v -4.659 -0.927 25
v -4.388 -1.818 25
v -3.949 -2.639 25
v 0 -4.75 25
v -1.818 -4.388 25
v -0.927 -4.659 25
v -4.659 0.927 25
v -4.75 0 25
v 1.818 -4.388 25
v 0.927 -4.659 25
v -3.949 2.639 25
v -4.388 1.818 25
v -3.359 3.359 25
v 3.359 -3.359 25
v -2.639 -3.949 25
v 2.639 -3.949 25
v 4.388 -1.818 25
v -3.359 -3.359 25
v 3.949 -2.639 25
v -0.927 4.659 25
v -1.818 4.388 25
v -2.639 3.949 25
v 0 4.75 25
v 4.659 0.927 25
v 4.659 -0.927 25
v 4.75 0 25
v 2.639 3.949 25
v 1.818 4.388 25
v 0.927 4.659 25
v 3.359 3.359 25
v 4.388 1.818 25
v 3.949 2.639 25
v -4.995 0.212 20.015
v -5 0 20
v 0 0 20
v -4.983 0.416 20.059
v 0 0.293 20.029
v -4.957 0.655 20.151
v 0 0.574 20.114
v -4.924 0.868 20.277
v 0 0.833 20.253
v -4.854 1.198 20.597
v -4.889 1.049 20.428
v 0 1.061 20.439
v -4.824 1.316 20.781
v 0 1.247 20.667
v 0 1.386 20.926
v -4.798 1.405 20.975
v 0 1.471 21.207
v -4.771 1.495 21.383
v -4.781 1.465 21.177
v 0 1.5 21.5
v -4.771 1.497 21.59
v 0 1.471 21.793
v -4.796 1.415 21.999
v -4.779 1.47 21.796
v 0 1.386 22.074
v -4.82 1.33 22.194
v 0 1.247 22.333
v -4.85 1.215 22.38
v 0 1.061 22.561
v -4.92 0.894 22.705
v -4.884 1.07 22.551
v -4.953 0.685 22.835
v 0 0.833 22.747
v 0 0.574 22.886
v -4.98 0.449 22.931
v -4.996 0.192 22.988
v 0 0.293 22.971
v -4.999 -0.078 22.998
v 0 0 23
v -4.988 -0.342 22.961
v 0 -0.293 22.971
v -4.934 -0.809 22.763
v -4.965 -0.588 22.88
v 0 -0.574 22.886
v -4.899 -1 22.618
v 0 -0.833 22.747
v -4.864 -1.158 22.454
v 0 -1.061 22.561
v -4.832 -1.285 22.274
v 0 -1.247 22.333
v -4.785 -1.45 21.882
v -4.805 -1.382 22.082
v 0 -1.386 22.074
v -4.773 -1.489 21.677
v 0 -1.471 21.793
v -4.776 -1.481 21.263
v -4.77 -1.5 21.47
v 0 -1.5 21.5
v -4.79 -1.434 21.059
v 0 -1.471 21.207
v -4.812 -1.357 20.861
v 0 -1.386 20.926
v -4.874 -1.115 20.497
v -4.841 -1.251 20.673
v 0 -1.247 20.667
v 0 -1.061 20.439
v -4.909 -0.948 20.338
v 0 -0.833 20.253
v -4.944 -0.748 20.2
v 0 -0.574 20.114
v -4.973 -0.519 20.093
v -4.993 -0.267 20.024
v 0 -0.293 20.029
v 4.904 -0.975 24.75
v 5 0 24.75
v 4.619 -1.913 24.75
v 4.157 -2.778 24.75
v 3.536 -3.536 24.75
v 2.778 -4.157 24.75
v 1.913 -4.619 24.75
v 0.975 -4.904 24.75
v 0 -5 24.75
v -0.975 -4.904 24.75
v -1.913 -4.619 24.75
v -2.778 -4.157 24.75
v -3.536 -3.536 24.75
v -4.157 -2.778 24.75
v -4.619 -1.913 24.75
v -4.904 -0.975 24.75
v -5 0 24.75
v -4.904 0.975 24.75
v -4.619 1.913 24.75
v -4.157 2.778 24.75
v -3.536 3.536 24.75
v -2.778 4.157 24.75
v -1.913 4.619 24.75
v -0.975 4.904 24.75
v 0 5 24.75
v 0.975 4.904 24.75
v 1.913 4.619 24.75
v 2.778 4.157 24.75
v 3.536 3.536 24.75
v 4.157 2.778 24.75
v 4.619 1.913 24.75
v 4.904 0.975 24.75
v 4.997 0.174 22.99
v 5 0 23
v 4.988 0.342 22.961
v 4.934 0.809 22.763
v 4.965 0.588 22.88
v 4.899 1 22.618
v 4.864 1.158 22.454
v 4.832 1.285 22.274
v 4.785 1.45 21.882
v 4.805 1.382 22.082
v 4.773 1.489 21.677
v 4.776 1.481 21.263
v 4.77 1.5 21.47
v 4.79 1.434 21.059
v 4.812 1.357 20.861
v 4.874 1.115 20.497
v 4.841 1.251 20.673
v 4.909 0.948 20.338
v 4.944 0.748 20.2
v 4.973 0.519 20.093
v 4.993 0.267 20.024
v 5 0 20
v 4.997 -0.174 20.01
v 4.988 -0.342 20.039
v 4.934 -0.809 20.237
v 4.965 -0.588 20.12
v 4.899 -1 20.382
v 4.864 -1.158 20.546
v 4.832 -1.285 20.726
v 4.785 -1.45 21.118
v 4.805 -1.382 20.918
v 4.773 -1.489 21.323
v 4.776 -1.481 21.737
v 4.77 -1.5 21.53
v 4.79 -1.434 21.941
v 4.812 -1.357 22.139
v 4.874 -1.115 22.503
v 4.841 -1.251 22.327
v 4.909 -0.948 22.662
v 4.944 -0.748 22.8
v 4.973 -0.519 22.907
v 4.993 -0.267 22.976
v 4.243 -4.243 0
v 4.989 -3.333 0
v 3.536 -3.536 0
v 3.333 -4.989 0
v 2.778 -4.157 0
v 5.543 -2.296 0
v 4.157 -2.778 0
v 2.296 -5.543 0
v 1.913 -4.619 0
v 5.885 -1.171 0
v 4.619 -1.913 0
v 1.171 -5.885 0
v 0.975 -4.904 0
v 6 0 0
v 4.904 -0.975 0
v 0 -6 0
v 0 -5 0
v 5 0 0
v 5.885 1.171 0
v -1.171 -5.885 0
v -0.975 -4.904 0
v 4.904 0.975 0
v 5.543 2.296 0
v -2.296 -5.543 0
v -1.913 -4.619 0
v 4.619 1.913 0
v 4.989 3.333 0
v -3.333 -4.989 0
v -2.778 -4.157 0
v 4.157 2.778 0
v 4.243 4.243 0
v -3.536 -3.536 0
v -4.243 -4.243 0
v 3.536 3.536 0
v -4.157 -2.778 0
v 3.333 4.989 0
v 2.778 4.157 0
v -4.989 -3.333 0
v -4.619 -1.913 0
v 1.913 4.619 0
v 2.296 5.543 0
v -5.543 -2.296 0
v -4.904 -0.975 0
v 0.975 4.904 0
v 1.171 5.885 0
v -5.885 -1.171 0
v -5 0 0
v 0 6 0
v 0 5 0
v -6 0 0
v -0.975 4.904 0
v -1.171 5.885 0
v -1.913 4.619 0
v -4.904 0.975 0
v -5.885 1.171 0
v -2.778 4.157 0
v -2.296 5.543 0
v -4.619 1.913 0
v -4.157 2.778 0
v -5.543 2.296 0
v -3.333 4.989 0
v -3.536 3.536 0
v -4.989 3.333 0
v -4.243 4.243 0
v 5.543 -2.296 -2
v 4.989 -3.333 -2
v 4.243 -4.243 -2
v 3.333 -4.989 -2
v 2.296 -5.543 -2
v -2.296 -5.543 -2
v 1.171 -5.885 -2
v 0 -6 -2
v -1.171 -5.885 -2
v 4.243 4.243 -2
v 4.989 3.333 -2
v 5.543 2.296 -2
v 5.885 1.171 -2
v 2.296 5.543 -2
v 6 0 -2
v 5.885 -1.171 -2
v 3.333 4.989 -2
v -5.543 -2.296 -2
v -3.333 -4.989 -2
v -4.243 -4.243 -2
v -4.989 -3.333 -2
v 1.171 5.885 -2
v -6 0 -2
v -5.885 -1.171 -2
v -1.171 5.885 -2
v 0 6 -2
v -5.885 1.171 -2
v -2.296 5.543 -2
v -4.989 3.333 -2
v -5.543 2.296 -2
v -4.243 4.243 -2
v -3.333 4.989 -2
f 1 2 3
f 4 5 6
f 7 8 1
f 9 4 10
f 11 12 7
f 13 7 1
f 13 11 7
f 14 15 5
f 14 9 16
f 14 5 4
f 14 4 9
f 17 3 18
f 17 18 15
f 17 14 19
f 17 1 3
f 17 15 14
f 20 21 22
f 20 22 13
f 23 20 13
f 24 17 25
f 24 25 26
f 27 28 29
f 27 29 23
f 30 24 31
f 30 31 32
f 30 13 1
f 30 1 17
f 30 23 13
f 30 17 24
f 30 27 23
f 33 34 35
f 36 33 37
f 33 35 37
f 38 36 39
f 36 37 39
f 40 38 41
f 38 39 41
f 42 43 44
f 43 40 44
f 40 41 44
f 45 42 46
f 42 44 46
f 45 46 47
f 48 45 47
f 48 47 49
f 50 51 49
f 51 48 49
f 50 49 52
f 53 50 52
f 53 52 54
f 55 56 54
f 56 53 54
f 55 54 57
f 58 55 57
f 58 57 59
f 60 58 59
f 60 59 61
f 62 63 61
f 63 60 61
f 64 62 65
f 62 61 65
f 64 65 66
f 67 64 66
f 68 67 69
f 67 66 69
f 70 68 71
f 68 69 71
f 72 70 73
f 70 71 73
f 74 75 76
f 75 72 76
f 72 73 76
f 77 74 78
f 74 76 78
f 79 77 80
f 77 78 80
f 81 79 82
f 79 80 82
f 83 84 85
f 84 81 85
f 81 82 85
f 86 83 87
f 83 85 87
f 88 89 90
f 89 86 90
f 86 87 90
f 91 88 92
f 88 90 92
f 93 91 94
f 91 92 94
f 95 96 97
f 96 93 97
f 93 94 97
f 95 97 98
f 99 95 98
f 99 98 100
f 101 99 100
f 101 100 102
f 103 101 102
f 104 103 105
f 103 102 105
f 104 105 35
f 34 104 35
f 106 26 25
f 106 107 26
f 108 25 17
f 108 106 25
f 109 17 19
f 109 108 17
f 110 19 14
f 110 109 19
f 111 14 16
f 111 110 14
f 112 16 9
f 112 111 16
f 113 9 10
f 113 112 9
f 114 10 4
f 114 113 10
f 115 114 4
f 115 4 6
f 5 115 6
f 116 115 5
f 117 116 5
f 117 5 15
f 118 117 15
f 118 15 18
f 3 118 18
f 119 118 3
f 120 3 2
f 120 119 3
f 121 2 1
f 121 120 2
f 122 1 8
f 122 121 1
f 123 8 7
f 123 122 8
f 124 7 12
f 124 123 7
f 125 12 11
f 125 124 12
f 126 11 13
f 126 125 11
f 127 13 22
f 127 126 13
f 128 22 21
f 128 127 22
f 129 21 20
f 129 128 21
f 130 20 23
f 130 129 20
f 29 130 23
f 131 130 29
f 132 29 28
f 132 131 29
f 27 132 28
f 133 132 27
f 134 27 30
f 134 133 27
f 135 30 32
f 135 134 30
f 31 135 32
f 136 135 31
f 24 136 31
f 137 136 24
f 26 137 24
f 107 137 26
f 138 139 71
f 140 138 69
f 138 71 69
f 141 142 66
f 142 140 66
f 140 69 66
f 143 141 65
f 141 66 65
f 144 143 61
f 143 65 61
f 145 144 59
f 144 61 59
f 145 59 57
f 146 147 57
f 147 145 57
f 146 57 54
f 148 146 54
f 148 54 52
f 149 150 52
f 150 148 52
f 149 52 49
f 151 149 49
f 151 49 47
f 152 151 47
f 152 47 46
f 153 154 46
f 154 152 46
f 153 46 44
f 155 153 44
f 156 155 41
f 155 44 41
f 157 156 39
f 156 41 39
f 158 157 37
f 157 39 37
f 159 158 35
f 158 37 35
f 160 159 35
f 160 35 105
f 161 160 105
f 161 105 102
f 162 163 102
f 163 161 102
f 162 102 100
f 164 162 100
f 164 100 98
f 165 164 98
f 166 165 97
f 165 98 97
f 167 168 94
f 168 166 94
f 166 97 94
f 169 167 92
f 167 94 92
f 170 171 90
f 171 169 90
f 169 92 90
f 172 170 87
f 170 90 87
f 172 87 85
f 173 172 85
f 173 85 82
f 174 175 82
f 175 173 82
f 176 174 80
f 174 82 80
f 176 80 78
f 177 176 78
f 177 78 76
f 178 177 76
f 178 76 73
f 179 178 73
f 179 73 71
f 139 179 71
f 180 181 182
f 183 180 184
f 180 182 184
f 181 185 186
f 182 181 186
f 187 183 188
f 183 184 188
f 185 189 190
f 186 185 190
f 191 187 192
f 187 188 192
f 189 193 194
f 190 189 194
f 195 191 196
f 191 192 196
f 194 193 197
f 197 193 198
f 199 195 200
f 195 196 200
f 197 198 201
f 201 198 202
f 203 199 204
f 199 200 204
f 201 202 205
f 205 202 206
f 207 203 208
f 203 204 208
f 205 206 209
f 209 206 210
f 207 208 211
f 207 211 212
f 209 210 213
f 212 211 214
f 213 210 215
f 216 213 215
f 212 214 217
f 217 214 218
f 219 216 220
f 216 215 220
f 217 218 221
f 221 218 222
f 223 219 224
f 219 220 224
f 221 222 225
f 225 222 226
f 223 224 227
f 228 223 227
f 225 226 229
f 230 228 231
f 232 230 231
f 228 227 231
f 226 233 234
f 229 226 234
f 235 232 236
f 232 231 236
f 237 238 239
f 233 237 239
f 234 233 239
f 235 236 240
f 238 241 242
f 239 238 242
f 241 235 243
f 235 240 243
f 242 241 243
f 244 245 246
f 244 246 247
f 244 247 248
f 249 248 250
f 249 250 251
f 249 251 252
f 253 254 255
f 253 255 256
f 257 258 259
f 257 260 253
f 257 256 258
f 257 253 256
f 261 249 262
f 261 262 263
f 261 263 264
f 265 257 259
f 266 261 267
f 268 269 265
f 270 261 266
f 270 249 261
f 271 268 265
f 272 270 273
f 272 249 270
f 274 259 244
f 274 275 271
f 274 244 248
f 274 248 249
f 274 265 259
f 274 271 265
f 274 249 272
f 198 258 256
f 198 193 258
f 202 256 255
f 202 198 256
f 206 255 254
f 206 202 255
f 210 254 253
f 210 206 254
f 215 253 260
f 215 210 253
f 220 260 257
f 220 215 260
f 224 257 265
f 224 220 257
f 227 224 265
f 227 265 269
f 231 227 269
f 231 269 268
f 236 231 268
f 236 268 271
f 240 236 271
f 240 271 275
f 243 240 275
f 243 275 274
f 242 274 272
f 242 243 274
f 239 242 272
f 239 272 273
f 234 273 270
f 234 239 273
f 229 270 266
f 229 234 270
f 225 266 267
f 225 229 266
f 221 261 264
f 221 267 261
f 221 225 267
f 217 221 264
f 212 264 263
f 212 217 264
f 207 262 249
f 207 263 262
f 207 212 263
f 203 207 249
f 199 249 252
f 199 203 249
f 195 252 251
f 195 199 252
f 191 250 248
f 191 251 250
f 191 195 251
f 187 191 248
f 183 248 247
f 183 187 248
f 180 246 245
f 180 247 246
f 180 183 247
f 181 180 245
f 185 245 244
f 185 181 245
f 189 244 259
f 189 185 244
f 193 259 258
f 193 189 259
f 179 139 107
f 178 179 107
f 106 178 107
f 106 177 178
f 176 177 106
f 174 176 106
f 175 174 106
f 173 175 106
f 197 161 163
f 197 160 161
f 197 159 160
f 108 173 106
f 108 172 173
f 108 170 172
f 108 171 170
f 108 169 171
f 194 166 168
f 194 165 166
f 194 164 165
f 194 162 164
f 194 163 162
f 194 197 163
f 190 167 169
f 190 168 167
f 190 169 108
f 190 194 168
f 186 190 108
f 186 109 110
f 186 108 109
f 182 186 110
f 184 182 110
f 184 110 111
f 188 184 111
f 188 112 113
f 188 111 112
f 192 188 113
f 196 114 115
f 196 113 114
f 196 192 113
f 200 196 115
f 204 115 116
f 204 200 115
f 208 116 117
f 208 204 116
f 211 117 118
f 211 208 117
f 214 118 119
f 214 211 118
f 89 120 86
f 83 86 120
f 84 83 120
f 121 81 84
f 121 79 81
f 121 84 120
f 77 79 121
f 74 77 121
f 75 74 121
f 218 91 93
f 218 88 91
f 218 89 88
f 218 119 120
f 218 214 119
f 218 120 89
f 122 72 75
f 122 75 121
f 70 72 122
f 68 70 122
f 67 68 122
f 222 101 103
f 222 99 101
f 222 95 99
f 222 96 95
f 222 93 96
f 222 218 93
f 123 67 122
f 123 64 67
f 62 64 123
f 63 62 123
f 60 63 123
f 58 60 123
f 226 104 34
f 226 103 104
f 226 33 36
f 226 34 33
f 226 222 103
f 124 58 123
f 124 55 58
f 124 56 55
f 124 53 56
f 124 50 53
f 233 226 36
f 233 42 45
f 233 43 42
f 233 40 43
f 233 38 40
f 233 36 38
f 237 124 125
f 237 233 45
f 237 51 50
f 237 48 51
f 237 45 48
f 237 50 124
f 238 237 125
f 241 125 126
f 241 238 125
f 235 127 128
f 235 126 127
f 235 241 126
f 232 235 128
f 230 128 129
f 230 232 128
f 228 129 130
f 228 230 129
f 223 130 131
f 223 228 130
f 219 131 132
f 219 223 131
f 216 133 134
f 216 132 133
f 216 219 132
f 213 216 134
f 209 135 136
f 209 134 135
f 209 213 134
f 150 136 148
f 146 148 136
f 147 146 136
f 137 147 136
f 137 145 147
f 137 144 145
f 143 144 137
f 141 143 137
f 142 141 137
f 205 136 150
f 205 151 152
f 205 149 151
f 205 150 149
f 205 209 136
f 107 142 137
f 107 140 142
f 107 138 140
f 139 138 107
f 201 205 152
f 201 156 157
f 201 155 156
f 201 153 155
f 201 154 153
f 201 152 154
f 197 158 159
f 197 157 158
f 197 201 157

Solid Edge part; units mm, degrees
sketch "Sketch1" plane through (0, 0, 0) normal (0, 0, 1) x (1, 0, 0)
  circle A0 centre (0, 0) radius 5
extrude "Protrusion1" add sketch "Sketch1" along normal blind 25
sketch "Sketch2" plane through (0, 0, 0) normal (0, 0, -1) x (1, 0, 0)
  circle A0 centre (0, 0) radius 6
extrude "Protrusion2" add sketch "Sketch2" along normal blind 2
hole "Hole1" at (0, 0, 21.5) direction (1, 0, 0) diameter 3 end through all both ways yes
chamfer "Chamfer1" distance 0.25 angle 45 1 edges at (-5, 0, 25)
properties part number "87451"
